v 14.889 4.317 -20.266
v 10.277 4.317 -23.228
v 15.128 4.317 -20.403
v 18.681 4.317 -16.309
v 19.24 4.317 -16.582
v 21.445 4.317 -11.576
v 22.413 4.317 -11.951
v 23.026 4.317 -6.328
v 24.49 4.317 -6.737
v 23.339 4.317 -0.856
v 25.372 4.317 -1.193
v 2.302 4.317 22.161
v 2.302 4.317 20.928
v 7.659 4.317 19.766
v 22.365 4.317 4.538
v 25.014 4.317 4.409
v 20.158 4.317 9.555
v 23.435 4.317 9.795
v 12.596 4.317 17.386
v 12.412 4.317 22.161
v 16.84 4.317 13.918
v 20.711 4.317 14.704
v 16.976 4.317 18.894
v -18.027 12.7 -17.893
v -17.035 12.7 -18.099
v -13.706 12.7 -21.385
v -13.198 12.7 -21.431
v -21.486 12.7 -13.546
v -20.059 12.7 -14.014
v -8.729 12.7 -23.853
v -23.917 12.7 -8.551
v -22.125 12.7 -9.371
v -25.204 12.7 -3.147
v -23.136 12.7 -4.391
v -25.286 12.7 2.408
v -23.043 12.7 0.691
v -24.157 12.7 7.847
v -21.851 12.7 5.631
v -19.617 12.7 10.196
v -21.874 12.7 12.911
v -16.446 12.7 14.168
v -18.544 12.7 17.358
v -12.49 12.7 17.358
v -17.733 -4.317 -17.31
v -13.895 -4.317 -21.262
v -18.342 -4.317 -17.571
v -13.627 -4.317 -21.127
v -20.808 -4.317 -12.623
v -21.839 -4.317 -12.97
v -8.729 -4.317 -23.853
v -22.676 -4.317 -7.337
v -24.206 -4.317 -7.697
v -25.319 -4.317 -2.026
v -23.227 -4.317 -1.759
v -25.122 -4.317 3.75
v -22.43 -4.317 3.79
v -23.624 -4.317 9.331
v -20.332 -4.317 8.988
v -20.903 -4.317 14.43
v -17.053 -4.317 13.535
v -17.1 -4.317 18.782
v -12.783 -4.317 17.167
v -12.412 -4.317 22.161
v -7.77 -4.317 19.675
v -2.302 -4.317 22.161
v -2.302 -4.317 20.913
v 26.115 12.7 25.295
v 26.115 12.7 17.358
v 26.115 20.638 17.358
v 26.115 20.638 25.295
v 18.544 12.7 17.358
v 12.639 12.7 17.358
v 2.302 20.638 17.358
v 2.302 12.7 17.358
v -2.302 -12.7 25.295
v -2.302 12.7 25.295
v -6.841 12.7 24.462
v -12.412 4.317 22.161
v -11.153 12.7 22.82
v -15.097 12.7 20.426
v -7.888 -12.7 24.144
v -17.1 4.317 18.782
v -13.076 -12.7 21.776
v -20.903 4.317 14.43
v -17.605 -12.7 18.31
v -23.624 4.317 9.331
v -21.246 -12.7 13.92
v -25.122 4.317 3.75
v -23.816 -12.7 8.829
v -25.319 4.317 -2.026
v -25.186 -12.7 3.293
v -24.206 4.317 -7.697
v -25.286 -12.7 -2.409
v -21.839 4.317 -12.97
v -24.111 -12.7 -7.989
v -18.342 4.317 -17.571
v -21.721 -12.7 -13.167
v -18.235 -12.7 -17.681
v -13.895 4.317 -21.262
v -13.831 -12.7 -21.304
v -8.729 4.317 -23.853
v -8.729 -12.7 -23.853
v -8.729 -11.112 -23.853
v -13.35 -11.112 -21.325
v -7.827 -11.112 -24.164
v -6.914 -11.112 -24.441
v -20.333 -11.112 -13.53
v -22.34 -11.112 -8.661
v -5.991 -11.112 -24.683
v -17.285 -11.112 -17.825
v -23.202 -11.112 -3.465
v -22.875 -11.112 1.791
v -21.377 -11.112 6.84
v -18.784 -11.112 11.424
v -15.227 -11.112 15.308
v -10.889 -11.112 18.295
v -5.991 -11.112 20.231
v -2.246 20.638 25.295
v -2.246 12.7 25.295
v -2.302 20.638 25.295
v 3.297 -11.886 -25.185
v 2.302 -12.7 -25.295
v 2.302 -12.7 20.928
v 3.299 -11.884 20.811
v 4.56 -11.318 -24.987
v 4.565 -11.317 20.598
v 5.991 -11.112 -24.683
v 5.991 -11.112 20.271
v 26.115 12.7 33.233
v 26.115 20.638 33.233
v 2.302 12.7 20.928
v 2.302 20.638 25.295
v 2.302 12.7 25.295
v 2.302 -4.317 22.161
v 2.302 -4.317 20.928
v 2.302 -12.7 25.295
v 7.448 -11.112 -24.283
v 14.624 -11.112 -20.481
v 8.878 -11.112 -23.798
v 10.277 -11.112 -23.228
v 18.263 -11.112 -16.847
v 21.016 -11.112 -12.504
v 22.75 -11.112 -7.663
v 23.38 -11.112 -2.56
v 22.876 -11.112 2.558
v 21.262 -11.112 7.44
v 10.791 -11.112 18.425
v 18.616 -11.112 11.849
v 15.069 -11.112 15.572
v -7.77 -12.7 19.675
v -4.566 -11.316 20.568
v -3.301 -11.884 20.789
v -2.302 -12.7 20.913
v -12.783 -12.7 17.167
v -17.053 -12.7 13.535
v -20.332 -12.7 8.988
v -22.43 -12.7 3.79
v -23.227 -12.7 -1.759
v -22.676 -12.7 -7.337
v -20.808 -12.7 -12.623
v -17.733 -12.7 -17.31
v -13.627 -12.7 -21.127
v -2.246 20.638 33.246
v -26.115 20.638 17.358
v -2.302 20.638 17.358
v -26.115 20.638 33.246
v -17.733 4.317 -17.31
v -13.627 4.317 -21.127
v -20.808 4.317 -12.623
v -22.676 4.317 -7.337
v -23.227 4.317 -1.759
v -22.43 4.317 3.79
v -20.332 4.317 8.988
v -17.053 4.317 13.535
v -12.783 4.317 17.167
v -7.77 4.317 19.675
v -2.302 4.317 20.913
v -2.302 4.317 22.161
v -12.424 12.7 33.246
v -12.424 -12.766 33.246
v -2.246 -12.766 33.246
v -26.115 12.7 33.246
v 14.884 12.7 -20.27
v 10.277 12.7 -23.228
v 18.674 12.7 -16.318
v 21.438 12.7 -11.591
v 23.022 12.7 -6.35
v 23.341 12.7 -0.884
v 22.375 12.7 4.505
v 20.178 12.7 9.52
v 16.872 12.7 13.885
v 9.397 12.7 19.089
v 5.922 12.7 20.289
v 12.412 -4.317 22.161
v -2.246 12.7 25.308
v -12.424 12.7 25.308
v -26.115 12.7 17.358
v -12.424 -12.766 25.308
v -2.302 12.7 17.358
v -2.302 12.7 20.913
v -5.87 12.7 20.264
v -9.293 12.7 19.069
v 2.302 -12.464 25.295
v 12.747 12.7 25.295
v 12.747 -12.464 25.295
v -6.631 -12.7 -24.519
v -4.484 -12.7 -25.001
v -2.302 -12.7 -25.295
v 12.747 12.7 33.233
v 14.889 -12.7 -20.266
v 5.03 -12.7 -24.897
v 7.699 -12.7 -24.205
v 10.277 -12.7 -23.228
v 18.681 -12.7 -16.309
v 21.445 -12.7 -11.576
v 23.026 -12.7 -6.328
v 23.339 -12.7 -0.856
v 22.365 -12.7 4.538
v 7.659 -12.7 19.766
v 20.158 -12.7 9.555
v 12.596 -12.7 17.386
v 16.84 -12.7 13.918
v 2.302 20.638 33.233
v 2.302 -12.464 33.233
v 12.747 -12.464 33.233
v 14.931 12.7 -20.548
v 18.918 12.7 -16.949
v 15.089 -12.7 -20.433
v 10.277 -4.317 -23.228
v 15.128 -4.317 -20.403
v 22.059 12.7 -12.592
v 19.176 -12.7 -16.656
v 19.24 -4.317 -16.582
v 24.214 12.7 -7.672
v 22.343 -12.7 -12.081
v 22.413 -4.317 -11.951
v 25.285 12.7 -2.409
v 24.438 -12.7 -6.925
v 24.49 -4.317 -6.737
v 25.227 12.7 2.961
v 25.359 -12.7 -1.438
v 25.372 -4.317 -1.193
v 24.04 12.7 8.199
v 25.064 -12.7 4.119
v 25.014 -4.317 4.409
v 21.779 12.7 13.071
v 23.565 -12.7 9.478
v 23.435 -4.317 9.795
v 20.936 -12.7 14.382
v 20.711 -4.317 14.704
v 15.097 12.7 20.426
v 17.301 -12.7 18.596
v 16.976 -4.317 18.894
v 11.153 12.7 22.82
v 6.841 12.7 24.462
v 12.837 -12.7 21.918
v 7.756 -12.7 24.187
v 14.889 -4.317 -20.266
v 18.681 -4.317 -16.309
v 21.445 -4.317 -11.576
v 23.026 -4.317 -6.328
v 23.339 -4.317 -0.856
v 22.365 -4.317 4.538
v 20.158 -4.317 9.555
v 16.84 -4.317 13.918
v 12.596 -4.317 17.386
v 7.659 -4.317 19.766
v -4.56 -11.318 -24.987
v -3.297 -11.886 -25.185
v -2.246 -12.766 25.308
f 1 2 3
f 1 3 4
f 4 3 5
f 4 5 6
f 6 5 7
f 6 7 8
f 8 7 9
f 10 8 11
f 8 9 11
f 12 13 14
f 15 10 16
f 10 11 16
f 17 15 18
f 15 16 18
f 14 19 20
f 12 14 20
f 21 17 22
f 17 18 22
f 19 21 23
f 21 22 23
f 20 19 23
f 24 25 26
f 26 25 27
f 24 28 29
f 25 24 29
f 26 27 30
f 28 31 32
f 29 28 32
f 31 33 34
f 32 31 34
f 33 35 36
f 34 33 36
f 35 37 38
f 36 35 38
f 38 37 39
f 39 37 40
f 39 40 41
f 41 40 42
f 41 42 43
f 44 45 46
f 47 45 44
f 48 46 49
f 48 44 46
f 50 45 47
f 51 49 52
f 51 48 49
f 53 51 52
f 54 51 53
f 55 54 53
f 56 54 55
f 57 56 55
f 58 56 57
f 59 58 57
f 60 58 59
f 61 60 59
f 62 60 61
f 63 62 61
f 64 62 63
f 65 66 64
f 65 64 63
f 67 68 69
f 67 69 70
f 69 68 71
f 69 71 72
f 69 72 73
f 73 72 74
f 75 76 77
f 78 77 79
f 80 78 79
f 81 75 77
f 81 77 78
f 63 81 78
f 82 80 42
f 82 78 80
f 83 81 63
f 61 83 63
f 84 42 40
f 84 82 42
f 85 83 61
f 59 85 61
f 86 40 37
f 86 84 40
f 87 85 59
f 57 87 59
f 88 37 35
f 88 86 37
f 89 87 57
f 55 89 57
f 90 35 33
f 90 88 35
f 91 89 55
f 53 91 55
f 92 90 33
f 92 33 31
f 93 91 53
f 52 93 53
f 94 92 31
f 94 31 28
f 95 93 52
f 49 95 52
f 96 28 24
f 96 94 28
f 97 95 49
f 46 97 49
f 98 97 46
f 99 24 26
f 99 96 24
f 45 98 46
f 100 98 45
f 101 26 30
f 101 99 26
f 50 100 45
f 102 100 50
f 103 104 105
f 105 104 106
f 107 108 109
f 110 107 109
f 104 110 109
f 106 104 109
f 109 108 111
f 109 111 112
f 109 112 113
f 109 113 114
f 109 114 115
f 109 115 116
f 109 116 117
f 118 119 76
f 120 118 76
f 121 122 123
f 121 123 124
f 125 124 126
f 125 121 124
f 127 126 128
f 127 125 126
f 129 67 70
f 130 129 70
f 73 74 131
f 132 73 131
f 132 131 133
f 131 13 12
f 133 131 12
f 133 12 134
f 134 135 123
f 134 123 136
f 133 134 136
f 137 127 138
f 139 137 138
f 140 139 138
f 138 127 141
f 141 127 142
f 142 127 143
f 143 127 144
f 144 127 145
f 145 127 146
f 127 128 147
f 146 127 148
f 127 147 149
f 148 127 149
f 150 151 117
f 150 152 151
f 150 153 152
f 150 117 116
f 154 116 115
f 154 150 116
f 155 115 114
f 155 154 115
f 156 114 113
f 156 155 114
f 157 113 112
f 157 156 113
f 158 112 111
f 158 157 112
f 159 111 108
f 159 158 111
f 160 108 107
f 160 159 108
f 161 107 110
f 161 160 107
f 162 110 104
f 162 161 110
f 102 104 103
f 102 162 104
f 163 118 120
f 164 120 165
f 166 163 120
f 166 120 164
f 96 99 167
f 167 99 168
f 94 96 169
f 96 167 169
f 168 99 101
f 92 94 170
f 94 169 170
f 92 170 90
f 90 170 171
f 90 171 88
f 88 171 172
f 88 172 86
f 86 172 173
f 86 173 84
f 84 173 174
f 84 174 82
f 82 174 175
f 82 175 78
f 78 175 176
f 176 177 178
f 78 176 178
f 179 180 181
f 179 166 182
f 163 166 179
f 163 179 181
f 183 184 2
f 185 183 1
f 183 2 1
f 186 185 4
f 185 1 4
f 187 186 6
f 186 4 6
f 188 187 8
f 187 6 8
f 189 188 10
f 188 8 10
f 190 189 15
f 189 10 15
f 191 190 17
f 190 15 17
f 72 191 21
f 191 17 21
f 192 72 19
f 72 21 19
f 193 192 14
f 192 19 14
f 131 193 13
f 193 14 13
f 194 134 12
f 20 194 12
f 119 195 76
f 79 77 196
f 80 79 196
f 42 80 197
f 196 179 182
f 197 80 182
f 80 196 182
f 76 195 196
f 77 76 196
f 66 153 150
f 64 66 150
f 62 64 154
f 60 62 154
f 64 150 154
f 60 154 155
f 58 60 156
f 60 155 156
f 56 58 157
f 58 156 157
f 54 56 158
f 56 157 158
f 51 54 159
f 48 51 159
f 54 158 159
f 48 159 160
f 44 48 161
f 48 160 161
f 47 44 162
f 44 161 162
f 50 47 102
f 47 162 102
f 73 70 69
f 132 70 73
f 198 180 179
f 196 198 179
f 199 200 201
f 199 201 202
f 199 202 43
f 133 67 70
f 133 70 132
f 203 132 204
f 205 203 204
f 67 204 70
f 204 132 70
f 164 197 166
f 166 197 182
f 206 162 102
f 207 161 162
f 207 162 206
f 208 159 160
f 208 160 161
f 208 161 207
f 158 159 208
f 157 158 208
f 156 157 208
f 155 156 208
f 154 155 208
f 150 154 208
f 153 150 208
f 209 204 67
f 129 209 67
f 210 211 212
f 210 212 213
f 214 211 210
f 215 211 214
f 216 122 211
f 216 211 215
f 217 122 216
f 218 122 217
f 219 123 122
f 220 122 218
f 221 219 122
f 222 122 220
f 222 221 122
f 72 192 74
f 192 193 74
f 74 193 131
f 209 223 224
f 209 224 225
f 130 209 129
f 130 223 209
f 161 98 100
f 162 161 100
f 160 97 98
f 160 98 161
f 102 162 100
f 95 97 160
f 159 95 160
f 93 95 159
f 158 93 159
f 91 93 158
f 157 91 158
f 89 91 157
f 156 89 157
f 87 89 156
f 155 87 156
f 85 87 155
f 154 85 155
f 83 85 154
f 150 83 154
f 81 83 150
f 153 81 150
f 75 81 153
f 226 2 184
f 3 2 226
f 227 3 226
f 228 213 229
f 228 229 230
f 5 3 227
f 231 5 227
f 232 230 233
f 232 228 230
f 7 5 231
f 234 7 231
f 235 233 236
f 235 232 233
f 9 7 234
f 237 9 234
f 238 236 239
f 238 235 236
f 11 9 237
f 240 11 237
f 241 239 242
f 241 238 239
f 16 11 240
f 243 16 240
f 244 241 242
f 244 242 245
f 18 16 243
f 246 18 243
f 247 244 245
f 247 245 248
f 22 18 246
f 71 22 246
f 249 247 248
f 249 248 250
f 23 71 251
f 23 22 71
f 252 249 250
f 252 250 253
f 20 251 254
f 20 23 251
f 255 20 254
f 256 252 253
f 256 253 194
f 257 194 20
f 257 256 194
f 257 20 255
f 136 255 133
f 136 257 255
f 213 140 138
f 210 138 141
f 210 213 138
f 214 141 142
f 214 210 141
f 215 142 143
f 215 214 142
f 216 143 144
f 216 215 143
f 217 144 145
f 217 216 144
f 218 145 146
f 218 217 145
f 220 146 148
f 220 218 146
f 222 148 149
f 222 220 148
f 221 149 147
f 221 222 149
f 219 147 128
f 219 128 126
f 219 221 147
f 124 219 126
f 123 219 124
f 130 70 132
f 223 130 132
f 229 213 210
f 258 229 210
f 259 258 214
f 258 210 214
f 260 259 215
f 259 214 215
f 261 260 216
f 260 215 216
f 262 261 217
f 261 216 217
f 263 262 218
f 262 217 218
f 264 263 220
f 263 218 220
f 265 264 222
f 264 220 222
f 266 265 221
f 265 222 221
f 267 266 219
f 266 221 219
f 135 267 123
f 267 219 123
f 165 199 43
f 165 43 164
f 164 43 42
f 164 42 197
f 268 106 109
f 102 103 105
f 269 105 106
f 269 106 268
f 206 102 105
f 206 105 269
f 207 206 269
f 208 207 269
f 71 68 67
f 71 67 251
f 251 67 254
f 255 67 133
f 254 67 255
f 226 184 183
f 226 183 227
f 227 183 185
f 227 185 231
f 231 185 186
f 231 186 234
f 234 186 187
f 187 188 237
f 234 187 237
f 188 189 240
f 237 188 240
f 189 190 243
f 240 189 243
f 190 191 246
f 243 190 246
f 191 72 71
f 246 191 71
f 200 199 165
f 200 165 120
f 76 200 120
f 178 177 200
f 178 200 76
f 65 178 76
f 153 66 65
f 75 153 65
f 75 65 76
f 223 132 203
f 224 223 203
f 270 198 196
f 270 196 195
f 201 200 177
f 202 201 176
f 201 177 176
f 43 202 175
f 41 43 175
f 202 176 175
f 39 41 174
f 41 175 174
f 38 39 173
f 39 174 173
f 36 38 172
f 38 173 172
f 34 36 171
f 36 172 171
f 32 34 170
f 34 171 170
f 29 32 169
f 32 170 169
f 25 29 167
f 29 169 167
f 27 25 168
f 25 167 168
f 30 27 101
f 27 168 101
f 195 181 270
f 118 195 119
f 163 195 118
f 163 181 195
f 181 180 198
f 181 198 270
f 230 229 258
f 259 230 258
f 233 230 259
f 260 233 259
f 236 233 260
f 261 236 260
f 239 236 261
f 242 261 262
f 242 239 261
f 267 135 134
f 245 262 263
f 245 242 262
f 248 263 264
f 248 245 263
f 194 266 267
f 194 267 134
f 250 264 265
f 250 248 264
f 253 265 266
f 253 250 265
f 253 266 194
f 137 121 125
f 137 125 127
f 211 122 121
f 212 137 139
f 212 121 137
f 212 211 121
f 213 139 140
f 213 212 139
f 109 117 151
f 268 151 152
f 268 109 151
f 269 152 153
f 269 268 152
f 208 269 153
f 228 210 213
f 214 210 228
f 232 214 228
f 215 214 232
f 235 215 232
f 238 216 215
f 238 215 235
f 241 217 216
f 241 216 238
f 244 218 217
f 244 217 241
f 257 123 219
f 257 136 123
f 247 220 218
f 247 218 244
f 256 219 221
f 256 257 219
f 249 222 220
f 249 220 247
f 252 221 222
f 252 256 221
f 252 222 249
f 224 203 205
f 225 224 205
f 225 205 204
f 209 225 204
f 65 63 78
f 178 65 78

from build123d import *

# Parameters (mm, degrees)
F0_R            = 25.4
F1_DEPTH        = 12.7
F2_W            = 8.63417238
F2_H            = 111.093018204
F3_DEPTH        = 38.1
F5_DEPTH        = 38.1
F6_W            = 4.6048974618
F6_H            = 114.5466864109
F7_DEPTH        = 38.1
F8_DEPTH        = 1.5875
F9_DEPTH        = 76.2
F10_DEPTH       = 25.4
F11_T1_DEPTH    = 64.6536648527
F11_S1_T1_DEPTH = 64.6684980489
F12_W           = 23.8125
F12_H           = 7.9375
F13_DEPTH       = 7.9375
F14_W           = 23.8125
F14_H           = 7.9375
F15_DEPTH       = 7.9375
F16_W           = 10.1776355878
F16_H           = 25.4661563456
F17_DEPTH       = 7.9375
F20_W           = 10.445
F20_H           = 25.1640297145
F21_DEPTH       = 7.938


# Not quite as in the source:
# - a fillet or chamfer that OpenCascade refuses, or shapes differently, is made with other operations: its cross-section is extruded or revolved along the edge and cut away or added


with BuildPart() as f1:
    # F0 (on Front) → F1 (new body, symmetric)
    with BuildSketch(Plane.XZ):
        Circle(F0_R)
    extrude(amount=F1_DEPTH, both=True)

    # F2 (on Right) → F3 (cut, symmetric)
    with BuildSketch(Plane.YZ):
        with Locations((0, -33.3854667842)):
            Rectangle(F2_W, F2_H)
    extrude(amount=F3_DEPTH, both=True, mode=Mode.SUBTRACT)

    # F4 (on face) → F5 (cut, symmetric)
    with BuildSketch(Plane.XZ.offset(12.7)):
        with BuildLine():
            ThreePointArc((-8.7293650817, -23.8528443853), (0.834589374, -25.3862848912), (10.2771759058, -23.2279929267))
            ThreePointArc((10.2771759058, -23.2279929267), (-0.6911145239, 21.0221106841), (-8.7293650817, -23.8528443853))
        make_face()
    extrude(amount=F5_DEPTH, both=True, mode=Mode.SUBTRACT)

    # F6 (on Top) → F7 (cut, symmetric)
    with BuildSketch(Plane.XY):
        with Locations((0, -20.7220129669)):
            Rectangle(F6_W, F6_H)
    extrude(amount=F7_DEPTH, both=True, mode=Mode.SUBTRACT)

    # F12 (on face) → F13 (join)
    with BuildSketch(Plane(origin=(0, 12.7, 0), x_dir=(-1, 0, 0), z_dir=(0, 1, 0))):
        with Locations((-14.2086987309, 21.3266790306)):
            Rectangle(F12_W, F12_H)
    extrude(amount=F13_DEPTH)

    # F14 (on face) → F15 (join)
    with BuildSketch(Plane(origin=(0, 12.7, 0), x_dir=(-1, 0, 0), z_dir=(0, 1, 0))):
        with Locations((14.2086987309, 21.3266790306)):
            Rectangle(F14_W, F14_H)
        Polygon((2.2461330518, 25.2954290306), (2.3024487309, 25.2954290306), (26.1149487309, 25.2954290306), (26.1149487309, 33.2456290306), (2.2461330518, 33.2456290306), align=None)
    extrude(amount=F15_DEPTH)

    # F16 (on face) → F17 (join)
    with BuildSketch(Plane.XY.offset(33.2456290306)):
        with Locations((-7.3349508457, -0.0330781728)):
            Rectangle(F16_W, F16_H)
    extrude(amount=-F17_DEPTH)


with BuildPart() as f8:
    # F4 (on face) → F8 (new body)
    with BuildSketch(Plane.XZ.offset(12.7)):
        with BuildLine():
            ThreePointArc((-8.7293650817, -23.8528443853), (0.834589374, -25.3862848912), (10.2771759058, -23.2279929267))
            ThreePointArc((10.2771759058, -23.2279929267), (-0.6911145239, 21.0221106841), (-8.7293650817, -23.8528443853))
        make_face()
    extrude(amount=-F8_DEPTH)

    # F6 (on Top) → F9 (cut)
    with BuildSketch(Plane.XY):
        with Locations((0, -20.7220129669)):
            Rectangle(F6_W, F6_H)
    extrude(amount=-F9_DEPTH, mode=Mode.SUBTRACT)

    # F6 (on Top) → F10 (cut, symmetric)
    with BuildSketch(Plane.XY):
        with Locations((0, -20.7220129669)):
            Rectangle(F6_W, F6_H)
    extrude(amount=F10_DEPTH, both=True, mode=Mode.SUBTRACT)

    # F11: fillet of radius 5.08 on 1 edges, made by hand

    # F11_s2 → F11_t1 (cut)
    with BuildSketch(Plane.XY.offset(-34.5179706237)):
        with BuildLine():
            ThreePointArc((-5.9914653682, -11.1125), (-3.983419054, -11.52622204), (-2.3024487309, -12.7))
            Line((-2.3024487309, -12.7), (-2.3024487309, -11.1125))
            Line((-2.3024487309, -11.1125), (-5.9914653682, -11.1125))
        make_face()
    extrude(amount=F11_T1_DEPTH, mode=Mode.SUBTRACT)

    # F11#s1: fillet of radius 5.08 on 1 edges, made by hand

    # F11_s1_s2 → F11_s1_t1 (cut)
    with BuildSketch(Plane.XY.offset(-34.5179706237)):
        with BuildLine():
            ThreePointArc((2.3024487309, -12.7), (3.983419054, -11.52622204), (5.9914653682, -11.1125))
            Line((5.9914653682, -11.1125), (2.3024487309, -11.1125))
            Line((2.3024487309, -11.1125), (2.3024487309, -12.7))
        make_face()
    extrude(amount=F11_S1_T1_DEPTH, mode=Mode.SUBTRACT)


with BuildPart() as f21:
    # F20 (on face) → F21 (new body)
    with BuildSketch(Plane.XY.offset(25.2954290306)):
        Polygon((26.1149487309, 20.6375), (2.3024487309, 20.6375), (2.3024487309, 12.7), (12.7474487309, 12.7), (26.1149487309, 12.7), align=None)
        with Locations((7.5249487309, 0.1179851428)):
            Rectangle(F20_W, F20_H)
    extrude(amount=F21_DEPTH)


solid = Compound([f1.part, f8.part, f21.part])
